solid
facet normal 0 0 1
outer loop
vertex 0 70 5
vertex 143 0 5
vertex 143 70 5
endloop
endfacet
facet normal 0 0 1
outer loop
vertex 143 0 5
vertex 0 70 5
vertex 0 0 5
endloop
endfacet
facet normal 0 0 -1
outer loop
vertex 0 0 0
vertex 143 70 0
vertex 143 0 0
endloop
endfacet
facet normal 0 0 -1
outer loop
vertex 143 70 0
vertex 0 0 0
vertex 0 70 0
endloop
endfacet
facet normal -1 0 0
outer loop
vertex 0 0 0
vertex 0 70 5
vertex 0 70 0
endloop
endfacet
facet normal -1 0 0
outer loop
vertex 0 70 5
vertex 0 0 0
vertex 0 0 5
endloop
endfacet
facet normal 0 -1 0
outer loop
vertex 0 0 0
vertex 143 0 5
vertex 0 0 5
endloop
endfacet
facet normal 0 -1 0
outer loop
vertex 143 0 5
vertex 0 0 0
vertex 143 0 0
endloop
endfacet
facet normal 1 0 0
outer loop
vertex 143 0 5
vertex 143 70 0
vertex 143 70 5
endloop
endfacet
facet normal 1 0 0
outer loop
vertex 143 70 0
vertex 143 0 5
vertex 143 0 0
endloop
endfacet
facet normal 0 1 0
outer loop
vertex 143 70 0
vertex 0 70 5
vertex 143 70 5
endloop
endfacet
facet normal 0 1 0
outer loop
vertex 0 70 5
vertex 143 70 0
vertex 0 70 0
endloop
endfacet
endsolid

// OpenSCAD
translate([5.5, 3.5, 2.5]) color([0.9872466462948367, 0.8614607202751068, 0.11884674531302208]) cube([11, 7, 5], center=true);
translate([16.5, 3.5, 2.5]) color([0.3168915355616677, 0.022725501526886682, 0.7337534213446073]) cube([11, 7, 5], center=true);
translate([27.5, 3.5, 2.5]) color([0.019200804366837798, 0.8859385148247924, 0.19334286484226215]) cube([11, 7, 5], center=true);
translate([38.5, 3.5, 2.5]) color([0.4138362902804684, 0.06203930600614804, 0.3112548872587563]) cube([11, 7, 5], center=true);
translate([49.5, 3.5, 2.5]) color([0.3895149894928328, 0.052230973545080106, 0.7675506531778632]) cube([11, 7, 5], center=true);
translate([60.5, 3.5, 2.5]) color([0.7113497195255859, 0.35788362412452357, 0.835192553154071]) cube([11, 7, 5], center=true);
translate([71.5, 3.5, 2.5]) color([0.07742180234362261, 0.05400640100767218, 0.35498029443727297]) cube([11, 7, 5], center=true);
translate([82.5, 3.5, 2.5]) color([0.9018413321683949, 0.7564677019106462, 0.6723176785539303]) cube([11, 7, 5], center=true);
translate([93.5, 3.5, 2.5]) color([0.5627357352457344, 0.80376553873448, 0.41222669318814775]) cube([11, 7, 5], center=true);
translate([104.5, 3.5, 2.5]) color([0.030688579780824843, 0.8024042864453003, 0.1904934342897321]) cube([11, 7, 5], center=true);
translate([115.5, 3.5, 2.5]) color([0.3876588498360868, 0.3576093472265096, 0.12336562593420342]) cube([11, 7, 5], center=true);
translate([126.5, 3.5, 2.5]) color([0.3507843689720118, 0.17708687785091481, 0.6160138300848896]) cube([11, 7, 5], center=true);
translate([137.5, 3.5, 2.5]) color([0.6534343577697814, 0.013646552881622753, 0.45647585236099164]) cube([11, 7, 5], center=true);
translate([5.5, 10.5, 2.5]) color([0.5540526564867162, 0.8716629944357835, 0.49603131023446156]) cube([11, 7, 5], center=true);
translate([16.5, 10.5, 2.5]) color([0.08045043690485232, 0.051723879096013836, 0.8621090829516437]) cube([11, 7, 5], center=true);
translate([27.5, 10.5, 2.5]) color([0.7907294093349121, 0.8584479311516113, 0.262242667584096]) cube([11, 7, 5], center=true);
translate([38.5, 10.5, 2.5]) color([0.6479973607947307, 0.09571804729550981, 0.8265731117136212]) cube([11, 7, 5], center=true);
translate([49.5, 10.5, 2.5]) color([0.33361293642632384, 0.9551472373193942, 0.4713825655590471]) cube([11, 7, 5], center=true);
translate([60.5, 10.5, 2.5]) color([0.0330676969459045, 0.909055877600589, 0.6255321488137767]) cube([11, 7, 5], center=true);
translate([71.5, 10.5, 2.5]) color([0.2870812860118641, 0.03680389375035842, 0.37668639673062454]) cube([11, 7, 5], center=true);
translate([82.5, 10.5, 2.5]) color([0.15686055976460878, 0.5482803113458813, 0.14688367516218315]) cube([11, 7, 5], center=true);
translate([93.5, 10.5, 2.5]) color([0.1746142788181122, 0.920869485728258, 0.6401200345146435]) cube([11, 7, 5], center=true);
translate([104.5, 10.5, 2.5]) color([0.24258141177262083, 0.8788962806324696, 0.6247158298512584]) cube([11, 7, 5], center=true);
translate([115.5, 10.5, 2.5]) color([0.9455993400800832, 0.4829167944087076, 0.8879008339780402]) cube([11, 7, 5], center=true);
translate([126.5, 10.5, 2.5]) color([0.678443807349386, 0.04416855593342761, 0.24029049005859915]) cube([11, 7, 5], center=true);
translate([137.5, 10.5, 2.5]) color([0.2815764049334011, 0.17001668338644926, 0.23818695062460127]) cube([11, 7, 5], center=true);
translate([5.5, 17.5, 2.5]) color([0.22604014846400422, 0.8783437492009086, 0.4628987935430291]) cube([11, 7, 5], center=true);
translate([16.5, 17.5, 2.5]) color([0.8765118313236592, 0.1379978834577653, 0.5649184865561083]) cube([11, 7, 5], center=true);
translate([27.5, 17.5, 2.5]) color([0.013467678145623552, 0.9303014098379871, 0.005637114397734955]) cube([11, 7, 5], center=true);
translate([38.5, 17.5, 2.5]) color([0.3899076485519639, 0.8015859586891702, 0.9998815592294843]) cube([11, 7, 5], center=true);
translate([49.5, 17.5, 2.5]) color([0.019509740361318695, 0.8240854838738103, 0.510087959495908]) cube([11, 7, 5], center=true);
translate([60.5, 17.5, 2.5]) color([0.038182020539084705, 0.7771192709025531, 0.11190241257102229]) cube([11, 7, 5], center=true);
translate([71.5, 17.5, 2.5]) color([0.6114741872824333, 0.7783252161231047, 0.6735909267280185]) cube([11, 7, 5], center=true);
translate([82.5, 17.5, 2.5]) color([0.3798743247069636, 0.026441636821160075, 0.43626396781238774]) cube([11, 7, 5], center=true);
translate([93.5, 17.5, 2.5]) color([0.9136944836857255, 0.33292336546782575, 0.24795871915323087]) cube([11, 7, 5], center=true);
translate([104.5, 17.5, 2.5]) color([0.13783083382268813, 0.5102524550010475, 0.5333482727437294]) cube([11, 7, 5], center=true);
translate([115.5, 17.5, 2.5]) color([0.07304824240354912, 0.40775848601839615, 0.6586814548864428]) cube([11, 7, 5], center=true);
translate([126.5, 17.5, 2.5]) color([0.9660506851714608, 0.43154112171906467, 0.4360353368941353]) cube([11, 7, 5], center=true);
translate([137.5, 17.5, 2.5]) color([0.47113397256850664, 0.2250334912265638, 0.3948376420144343]) cube([11, 7, 5], center=true);
translate([5.5, 24.5, 2.5]) color([0.6452647259919572, 0.39705920905186254, 0.5813757484333044]) cube([11, 7, 5], center=true);
translate([16.5, 24.5, 2.5]) color([0.8355822879997544, 0.997967573075557, 0.8850396836294676]) cube([11, 7, 5], center=true);
translate([27.5, 24.5, 2.5]) color([0.3717966269131009, 0.02172713431740758, 0.6116045995026433]) cube([11, 7, 5], center=true);
translate([38.5, 24.5, 2.5]) color([0.4745507082101075, 0.23701711204858011, 0.040304099105049285]) cube([11, 7, 5], center=true);
translate([49.5, 24.5, 2.5]) color([0.3215702389727013, 0.7980713128356309, 0.9641190068878396]) cube([11, 7, 5], center=true);
translate([60.5, 24.5, 2.5]) color([0.10666013907247773, 0.8776394117814497, 0.04871767121707815]) cube([11, 7, 5], center=true);
translate([71.5, 24.5, 2.5]) color([0.7134758188756509, 0.026795713363172546, 0.4210496822819296]) cube([11, 7, 5], center=true);
translate([82.5, 24.5, 2.5]) color([0.8702308384812625, 0.39310814762828206, 0.9245643176497426]) cube([11, 7, 5], center=true);
translate([93.5, 24.5, 2.5]) color([0.7131951411119577, 0.6041842807977467, 0.16137904800183167]) cube([11, 7, 5], center=true);
translate([104.5, 24.5, 2.5]) color([0.34049578364460964, 0.4110961642787554, 0.5902048641324954]) cube([11, 7, 5], center=true);
translate([115.5, 24.5, 2.5]) color([0.9960381602092927, 0.2837097478049315, 0.5035628908314976]) cube([11, 7, 5], center=true);
translate([126.5, 24.5, 2.5]) color([0.9334479076287334, 0.3454207937620084, 0.6286047872723735]) cube([11, 7, 5], center=true);
translate([137.5, 24.5, 2.5]) color([0.7661315386941904, 0.6302697250151431, 0.7534306798421236]) cube([11, 7, 5], center=true);
translate([5.5, 31.5, 2.5]) color([0.19569300023569658, 0.9573376868488813, 0.17689780684900636]) cube([11, 7, 5], center=true);
translate([16.5, 31.5, 2.5]) color([0.583681176041597, 0.2960426090666165, 0.6344230252613314]) cube([11, 7, 5], center=true);
translate([27.5, 31.5, 2.5]) color([0.2911104153948655, 0.4312133568145403, 0.6822225482057551]) cube([11, 7, 5], center=true);
translate([38.5, 31.5, 2.5]) color([0.2690687505540429, 0.7278758824480682, 0.346877672777792]) cube([11, 7, 5], center=true);
translate([49.5, 31.5, 2.5]) color([0.1321560972206215, 0.613128716923026, 0.1657580288590924]) cube([11, 7, 5], center=true);
translate([60.5, 31.5, 2.5]) color([0.4305774463467016, 0.398397411879296, 0.07616884739618512]) cube([11, 7, 5], center=true);
translate([71.5, 31.5, 2.5]) color([0.7107698374020727, 0.6808235651092605, 0.7777950050341181]) cube([11, 7, 5], center=true);
translate([82.5, 31.5, 2.5]) color([0.5449131408796454, 0.5539167757205721, 0.1692330029082909]) cube([11, 7, 5], center=true);
translate([93.5, 31.5, 2.5]) color([0.2074638989900912, 0.22824949048252774, 0.5253035287227936]) cube([11, 7, 5], center=true);
translate([104.5, 31.5, 2.5]) color([0.8189825824874795, 0.3569741167117525, 0.881871988053252]) cube([11, 7, 5], center=true);
translate([115.5, 31.5, 2.5]) color([0.7358782685401997, 0.7164471432061884, 0.335172129304652]) cube([11, 7, 5], center=true);
translate([126.5, 31.5, 2.5]) color([0.11847749205352176, 0.962790481106405, 0.8546106356240183]) cube([11, 7, 5], center=true);
translate([137.5, 31.5, 2.5]) color([0.4088679907725796, 0.863218190236155, 0.8992171150320745]) cube([11, 7, 5], center=true);
translate([5.5, 38.5, 2.5]) color([0.34247362336498666, 0.5015614924470504, 0.331789840259637]) cube([11, 7, 5], center=true);
translate([16.5, 38.5, 2.5]) color([0.6951575140996313, 0.9121673135171753, 0.9845441038891614]) cube([11, 7, 5], center=true);
translate([27.5, 38.5, 2.5]) color([0.743779074814013, 0.30524235393506627, 0.8804932900877588]) cube([11, 7, 5], center=true);
translate([38.5, 38.5, 2.5]) color([0.9926196290445818, 0.3465261637439211, 0.9487123524492477]) cube([11, 7, 5], center=true);
translate([49.5, 38.5, 2.5]) color([0.5115464054506906, 0.9646354422725825, 0.9958559900991514]) cube([11, 7, 5], center=true);
translate([60.5, 38.5, 2.5]) color([0.8129420958288965, 0.683437049189351, 0.15401446929310414]) cube([11, 7, 5], center=true);
translate([71.5, 38.5, 2.5]) color([0.004917283233195846, 0.595470850423361, 0.7044599054830536]) cube([11, 7, 5], center=true);
translate([82.5, 38.5, 2.5]) color([0.9355380451790102, 0.5171199001879537, 0.6968466027027539]) cube([11, 7, 5], center=true);
translate([93.5, 38.5, 2.5]) color([0.6473559714710018, 0.2049201249762317, 0.6443000927800802]) cube([11, 7, 5], center=true);
translate([104.5, 38.5, 2.5]) color([0.9817212113250201, 0.11118495663016492, 0.6885432431989881]) cube([11, 7, 5], center=true);
translate([115.5, 38.5, 2.5]) color([0.6143051174926554, 0.3758547237916068, 0.7933477538527628]) cube([11, 7, 5], center=true);
translate([126.5, 38.5, 2.5]) color([0.01048585858492923, 0.8924116221231707, 0.8173639530127002]) cube([11, 7, 5], center=true);
translate([137.5, 38.5, 2.5]) color([0.4807048314687138, 0.10813915488104964, 0.45262855566363425]) cube([11, 7, 5], center=true);
translate([5.5, 45.5, 2.5]) color([0.584252899115387, 0.25388347854124227, 0.48653146484559573]) cube([11, 7, 5], center=true);
translate([16.5, 45.5, 2.5]) color([0.7757287638538752, 0.9227317956018974, 0.5616450276347316]) cube([11, 7, 5], center=true);
translate([27.5, 45.5, 2.5]) color([0.8272417850395823, 0.07793321296960098, 0.8563680463134653]) cube([11, 7, 5], center=true);
translate([38.5, 45.5, 2.5]) color([0.9208145654644209, 0.16800137628452116, 0.8274873617530726]) cube([11, 7, 5], center=true);
translate([49.5, 45.5, 2.5]) color([0.8495661703259881, 0.8786588683257629, 0.5171395198173923]) cube([11, 7, 5], center=true);
translate([60.5, 45.5, 2.5]) color([0.6082542438853435, 0.20808324544269907, 0.7081315493857046]) cube([11, 7, 5], center=true);
translate([71.5, 45.5, 2.5]) color([0.4050173034081427, 0.021169085707055446, 0.13426711350425513]) cube([11, 7, 5], center=true);
translate([82.5, 45.5, 2.5]) color([0.3882180316100641, 0.885179806060811, 0.5649422932688362]) cube([11, 7, 5], center=true);
translate([93.5, 45.5, 2.5]) color([0.916257034056247, 0.9294838443573096, 0.08679499211949981]) cube([11, 7, 5], center=true);
translate([104.5, 45.5, 2.5]) color([0.5882154137282689, 0.33452803815227405, 0.5067951222763686]) cube([11, 7, 5], center=true);
translate([115.5, 45.5, 2.5]) color([0.4555248024993094, 0.4799432726204613, 0.10180580816188334]) cube([11, 7, 5], center=true);
translate([126.5, 45.5, 2.5]) color([0.8331600837968306, 0.49027996175581356, 0.6449875562942834]) cube([11, 7, 5], center=true);
translate([137.5, 45.5, 2.5]) color([0.4726787527300935, 0.18101837657221131, 0.5410005849921866]) cube([11, 7, 5], center=true);
translate([5.5, 52.5, 2.5]) color([0.15953973906080132, 0.8521792561475834, 0.8316040256381448]) cube([11, 7, 5], center=true);
translate([16.5, 52.5, 2.5]) color([0.14363877815694315, 0.06884395303143254, 0.06849191694044987]) cube([11, 7, 5], center=true);
translate([27.5, 52.5, 2.5]) color([0.39324402485877463, 0.9530414373426318, 0.5561404160577164]) cube([11, 7, 5], center=true);
translate([38.5, 52.5, 2.5]) color([0.2655265739730889, 0.22964882712417878, 0.11087319475929203]) cube([11, 7, 5], center=true);
translate([49.5, 52.5, 2.5]) color([0.14107121049957605, 0.811863266633069, 0.1386334647121824]) cube([11, 7, 5], center=true);
translate([60.5, 52.5, 2.5]) color([0.8640615571790076, 0.8229980741854441, 0.1368088020868221]) cube([11, 7, 5], center=true);
translate([71.5, 52.5, 2.5]) color([0.5587247699387591, 0.007055267937954968, 0.8620361343350499]) cube([11, 7, 5], center=true);
translate([82.5, 52.5, 2.5]) color([0.5582771204396142, 0.7553403943905439, 0.49034532691625843]) cube([11, 7, 5], center=true);
translate([93.5, 52.5, 2.5]) color([0.6904219992983678, 0.9312391241860541, 0.5595458101278583]) cube([11, 7, 5], center=true);
translate([104.5, 52.5, 2.5]) color([0.874705476910058, 0.3430454423471212, 0.097532545668922]) cube([11, 7, 5], center=true);
translate([115.5, 52.5, 2.5]) color([0.0051446426040608895, 0.22665027899847212, 0.8385868369358646]) cube([11, 7, 5], center=true);
translate([126.5, 52.5, 2.5]) color([0.3114954626147214, 0.2246161476446097, 0.4956304233883704]) cube([11, 7, 5], center=true);
translate([137.5, 52.5, 2.5]) color([0.9469041224934578, 0.5089784482606999, 0.3408716625844388]) cube([11, 7, 5], center=true);
translate([5.5, 59.5, 2.5]) color([0.07750179100607058, 0.5736669333449989, 0.2262569795471856]) cube([11, 7, 5], center=true);
translate([16.5, 59.5, 2.5]) color([0.36749912771263804, 0.3811623667235057, 0.758184337209737]) cube([11, 7, 5], center=true);
translate([27.5, 59.5, 2.5]) color([0.2316288447968865, 0.9358922257968159, 0.7423880679625546]) cube([11, 7, 5], center=true);
translate([38.5, 59.5, 2.5]) color([0.4811195407808191, 0.8804744912800886, 0.3591679802752926]) cube([11, 7, 5], center=true);
translate([49.5, 59.5, 2.5]) color([0.3843398735852277, 0.1293691309627325, 0.7785560944636153]) cube([11, 7, 5], center=true);
translate([60.5, 59.5, 2.5]) color([0.4011926528443319, 0.500253028189022, 0.470968665396031]) cube([11, 7, 5], center=true);
translate([71.5, 59.5, 2.5]) color([0.6561818175710772, 0.3739384310853442, 0.9158613261487422]) cube([11, 7, 5], center=true);
translate([82.5, 59.5, 2.5]) color([0.43192225901344306, 0.3592139778487352, 0.40087805515024044]) cube([11, 7, 5], center=true);
translate([93.5, 59.5, 2.5]) color([0.7662957214889635, 0.9930565899841893, 0.8665146463013338]) cube([11, 7, 5], center=true);
translate([104.5, 59.5, 2.5]) color([0.47972749846874807, 0.29135934353342297, 0.44598705436487596]) cube([11, 7, 5], center=true);
translate([115.5, 59.5, 2.5]) color([0.34401555309356413, 0.24353205221386098, 0.1869409153584496]) cube([11, 7, 5], center=true);
translate([126.5, 59.5, 2.5]) color([0.955875734523651, 0.49930519035977794, 0.10997487367023018]) cube([11, 7, 5], center=true);
translate([137.5, 59.5, 2.5]) color([0.38390661012612914, 0.3887169172228757, 0.5135345269871933]) cube([11, 7, 5], center=true);
translate([5.5, 66.5, 2.5]) color([0.9800413246136939, 0.9766334965740477, 0.5658941107131482]) cube([11, 7, 5], center=true);
translate([16.5, 66.5, 2.5]) color([0.618091525291319, 0.6756290748662368, 0.5022221826851782]) cube([11, 7, 5], center=true);
translate([27.5, 66.5, 2.5]) color([0.48667805815232146, 0.3145239391767841, 0.6839217394712661]) cube([11, 7, 5], center=true);
translate([38.5, 66.5, 2.5]) color([0.0918952783328747, 0.31714524622461493, 0.8909785594776133]) cube([11, 7, 5], center=true);
translate([49.5, 66.5, 2.5]) color([0.22737815097545244, 0.9675823780249894, 0.9841697219657126]) cube([11, 7, 5], center=true);
translate([60.5, 66.5, 2.5]) color([0.5753826630962362, 0.040435980308822006, 0.09347819733219331]) cube([11, 7, 5], center=true);
translate([71.5, 66.5, 2.5]) color([0.20030163768999243, 0.32681156827935265, 0.11310821161287443]) cube([11, 7, 5], center=true);
translate([82.5, 66.5, 2.5]) color([0.7972107730705184, 0.36415457001524065, 0.23373369837467228]) cube([11, 7, 5], center=true);
translate([93.5, 66.5, 2.5]) color([0.04369387036630823, 0.38267185937298054, 0.004506730509222345]) cube([11, 7, 5], center=true);
translate([104.5, 66.5, 2.5]) color([0.11649145052958731, 0.6046455100616726, 0.9349454113281106]) cube([11, 7, 5], center=true);
translate([115.5, 66.5, 2.5]) color([0.19936592192623293, 0.7410612066543879, 0.19770552104537242]) cube([11, 7, 5], center=true);
translate([126.5, 66.5, 2.5]) color([0.0014951938407173904, 0.8965380461618023, 0.8461087377012069]) cube([11, 7, 5], center=true);
translate([137.5, 66.5, 2.5]) color([0.06677871597507445, 0.17713528816386948, 0.23430092801861246]) cube([11, 7, 5], center=true);
